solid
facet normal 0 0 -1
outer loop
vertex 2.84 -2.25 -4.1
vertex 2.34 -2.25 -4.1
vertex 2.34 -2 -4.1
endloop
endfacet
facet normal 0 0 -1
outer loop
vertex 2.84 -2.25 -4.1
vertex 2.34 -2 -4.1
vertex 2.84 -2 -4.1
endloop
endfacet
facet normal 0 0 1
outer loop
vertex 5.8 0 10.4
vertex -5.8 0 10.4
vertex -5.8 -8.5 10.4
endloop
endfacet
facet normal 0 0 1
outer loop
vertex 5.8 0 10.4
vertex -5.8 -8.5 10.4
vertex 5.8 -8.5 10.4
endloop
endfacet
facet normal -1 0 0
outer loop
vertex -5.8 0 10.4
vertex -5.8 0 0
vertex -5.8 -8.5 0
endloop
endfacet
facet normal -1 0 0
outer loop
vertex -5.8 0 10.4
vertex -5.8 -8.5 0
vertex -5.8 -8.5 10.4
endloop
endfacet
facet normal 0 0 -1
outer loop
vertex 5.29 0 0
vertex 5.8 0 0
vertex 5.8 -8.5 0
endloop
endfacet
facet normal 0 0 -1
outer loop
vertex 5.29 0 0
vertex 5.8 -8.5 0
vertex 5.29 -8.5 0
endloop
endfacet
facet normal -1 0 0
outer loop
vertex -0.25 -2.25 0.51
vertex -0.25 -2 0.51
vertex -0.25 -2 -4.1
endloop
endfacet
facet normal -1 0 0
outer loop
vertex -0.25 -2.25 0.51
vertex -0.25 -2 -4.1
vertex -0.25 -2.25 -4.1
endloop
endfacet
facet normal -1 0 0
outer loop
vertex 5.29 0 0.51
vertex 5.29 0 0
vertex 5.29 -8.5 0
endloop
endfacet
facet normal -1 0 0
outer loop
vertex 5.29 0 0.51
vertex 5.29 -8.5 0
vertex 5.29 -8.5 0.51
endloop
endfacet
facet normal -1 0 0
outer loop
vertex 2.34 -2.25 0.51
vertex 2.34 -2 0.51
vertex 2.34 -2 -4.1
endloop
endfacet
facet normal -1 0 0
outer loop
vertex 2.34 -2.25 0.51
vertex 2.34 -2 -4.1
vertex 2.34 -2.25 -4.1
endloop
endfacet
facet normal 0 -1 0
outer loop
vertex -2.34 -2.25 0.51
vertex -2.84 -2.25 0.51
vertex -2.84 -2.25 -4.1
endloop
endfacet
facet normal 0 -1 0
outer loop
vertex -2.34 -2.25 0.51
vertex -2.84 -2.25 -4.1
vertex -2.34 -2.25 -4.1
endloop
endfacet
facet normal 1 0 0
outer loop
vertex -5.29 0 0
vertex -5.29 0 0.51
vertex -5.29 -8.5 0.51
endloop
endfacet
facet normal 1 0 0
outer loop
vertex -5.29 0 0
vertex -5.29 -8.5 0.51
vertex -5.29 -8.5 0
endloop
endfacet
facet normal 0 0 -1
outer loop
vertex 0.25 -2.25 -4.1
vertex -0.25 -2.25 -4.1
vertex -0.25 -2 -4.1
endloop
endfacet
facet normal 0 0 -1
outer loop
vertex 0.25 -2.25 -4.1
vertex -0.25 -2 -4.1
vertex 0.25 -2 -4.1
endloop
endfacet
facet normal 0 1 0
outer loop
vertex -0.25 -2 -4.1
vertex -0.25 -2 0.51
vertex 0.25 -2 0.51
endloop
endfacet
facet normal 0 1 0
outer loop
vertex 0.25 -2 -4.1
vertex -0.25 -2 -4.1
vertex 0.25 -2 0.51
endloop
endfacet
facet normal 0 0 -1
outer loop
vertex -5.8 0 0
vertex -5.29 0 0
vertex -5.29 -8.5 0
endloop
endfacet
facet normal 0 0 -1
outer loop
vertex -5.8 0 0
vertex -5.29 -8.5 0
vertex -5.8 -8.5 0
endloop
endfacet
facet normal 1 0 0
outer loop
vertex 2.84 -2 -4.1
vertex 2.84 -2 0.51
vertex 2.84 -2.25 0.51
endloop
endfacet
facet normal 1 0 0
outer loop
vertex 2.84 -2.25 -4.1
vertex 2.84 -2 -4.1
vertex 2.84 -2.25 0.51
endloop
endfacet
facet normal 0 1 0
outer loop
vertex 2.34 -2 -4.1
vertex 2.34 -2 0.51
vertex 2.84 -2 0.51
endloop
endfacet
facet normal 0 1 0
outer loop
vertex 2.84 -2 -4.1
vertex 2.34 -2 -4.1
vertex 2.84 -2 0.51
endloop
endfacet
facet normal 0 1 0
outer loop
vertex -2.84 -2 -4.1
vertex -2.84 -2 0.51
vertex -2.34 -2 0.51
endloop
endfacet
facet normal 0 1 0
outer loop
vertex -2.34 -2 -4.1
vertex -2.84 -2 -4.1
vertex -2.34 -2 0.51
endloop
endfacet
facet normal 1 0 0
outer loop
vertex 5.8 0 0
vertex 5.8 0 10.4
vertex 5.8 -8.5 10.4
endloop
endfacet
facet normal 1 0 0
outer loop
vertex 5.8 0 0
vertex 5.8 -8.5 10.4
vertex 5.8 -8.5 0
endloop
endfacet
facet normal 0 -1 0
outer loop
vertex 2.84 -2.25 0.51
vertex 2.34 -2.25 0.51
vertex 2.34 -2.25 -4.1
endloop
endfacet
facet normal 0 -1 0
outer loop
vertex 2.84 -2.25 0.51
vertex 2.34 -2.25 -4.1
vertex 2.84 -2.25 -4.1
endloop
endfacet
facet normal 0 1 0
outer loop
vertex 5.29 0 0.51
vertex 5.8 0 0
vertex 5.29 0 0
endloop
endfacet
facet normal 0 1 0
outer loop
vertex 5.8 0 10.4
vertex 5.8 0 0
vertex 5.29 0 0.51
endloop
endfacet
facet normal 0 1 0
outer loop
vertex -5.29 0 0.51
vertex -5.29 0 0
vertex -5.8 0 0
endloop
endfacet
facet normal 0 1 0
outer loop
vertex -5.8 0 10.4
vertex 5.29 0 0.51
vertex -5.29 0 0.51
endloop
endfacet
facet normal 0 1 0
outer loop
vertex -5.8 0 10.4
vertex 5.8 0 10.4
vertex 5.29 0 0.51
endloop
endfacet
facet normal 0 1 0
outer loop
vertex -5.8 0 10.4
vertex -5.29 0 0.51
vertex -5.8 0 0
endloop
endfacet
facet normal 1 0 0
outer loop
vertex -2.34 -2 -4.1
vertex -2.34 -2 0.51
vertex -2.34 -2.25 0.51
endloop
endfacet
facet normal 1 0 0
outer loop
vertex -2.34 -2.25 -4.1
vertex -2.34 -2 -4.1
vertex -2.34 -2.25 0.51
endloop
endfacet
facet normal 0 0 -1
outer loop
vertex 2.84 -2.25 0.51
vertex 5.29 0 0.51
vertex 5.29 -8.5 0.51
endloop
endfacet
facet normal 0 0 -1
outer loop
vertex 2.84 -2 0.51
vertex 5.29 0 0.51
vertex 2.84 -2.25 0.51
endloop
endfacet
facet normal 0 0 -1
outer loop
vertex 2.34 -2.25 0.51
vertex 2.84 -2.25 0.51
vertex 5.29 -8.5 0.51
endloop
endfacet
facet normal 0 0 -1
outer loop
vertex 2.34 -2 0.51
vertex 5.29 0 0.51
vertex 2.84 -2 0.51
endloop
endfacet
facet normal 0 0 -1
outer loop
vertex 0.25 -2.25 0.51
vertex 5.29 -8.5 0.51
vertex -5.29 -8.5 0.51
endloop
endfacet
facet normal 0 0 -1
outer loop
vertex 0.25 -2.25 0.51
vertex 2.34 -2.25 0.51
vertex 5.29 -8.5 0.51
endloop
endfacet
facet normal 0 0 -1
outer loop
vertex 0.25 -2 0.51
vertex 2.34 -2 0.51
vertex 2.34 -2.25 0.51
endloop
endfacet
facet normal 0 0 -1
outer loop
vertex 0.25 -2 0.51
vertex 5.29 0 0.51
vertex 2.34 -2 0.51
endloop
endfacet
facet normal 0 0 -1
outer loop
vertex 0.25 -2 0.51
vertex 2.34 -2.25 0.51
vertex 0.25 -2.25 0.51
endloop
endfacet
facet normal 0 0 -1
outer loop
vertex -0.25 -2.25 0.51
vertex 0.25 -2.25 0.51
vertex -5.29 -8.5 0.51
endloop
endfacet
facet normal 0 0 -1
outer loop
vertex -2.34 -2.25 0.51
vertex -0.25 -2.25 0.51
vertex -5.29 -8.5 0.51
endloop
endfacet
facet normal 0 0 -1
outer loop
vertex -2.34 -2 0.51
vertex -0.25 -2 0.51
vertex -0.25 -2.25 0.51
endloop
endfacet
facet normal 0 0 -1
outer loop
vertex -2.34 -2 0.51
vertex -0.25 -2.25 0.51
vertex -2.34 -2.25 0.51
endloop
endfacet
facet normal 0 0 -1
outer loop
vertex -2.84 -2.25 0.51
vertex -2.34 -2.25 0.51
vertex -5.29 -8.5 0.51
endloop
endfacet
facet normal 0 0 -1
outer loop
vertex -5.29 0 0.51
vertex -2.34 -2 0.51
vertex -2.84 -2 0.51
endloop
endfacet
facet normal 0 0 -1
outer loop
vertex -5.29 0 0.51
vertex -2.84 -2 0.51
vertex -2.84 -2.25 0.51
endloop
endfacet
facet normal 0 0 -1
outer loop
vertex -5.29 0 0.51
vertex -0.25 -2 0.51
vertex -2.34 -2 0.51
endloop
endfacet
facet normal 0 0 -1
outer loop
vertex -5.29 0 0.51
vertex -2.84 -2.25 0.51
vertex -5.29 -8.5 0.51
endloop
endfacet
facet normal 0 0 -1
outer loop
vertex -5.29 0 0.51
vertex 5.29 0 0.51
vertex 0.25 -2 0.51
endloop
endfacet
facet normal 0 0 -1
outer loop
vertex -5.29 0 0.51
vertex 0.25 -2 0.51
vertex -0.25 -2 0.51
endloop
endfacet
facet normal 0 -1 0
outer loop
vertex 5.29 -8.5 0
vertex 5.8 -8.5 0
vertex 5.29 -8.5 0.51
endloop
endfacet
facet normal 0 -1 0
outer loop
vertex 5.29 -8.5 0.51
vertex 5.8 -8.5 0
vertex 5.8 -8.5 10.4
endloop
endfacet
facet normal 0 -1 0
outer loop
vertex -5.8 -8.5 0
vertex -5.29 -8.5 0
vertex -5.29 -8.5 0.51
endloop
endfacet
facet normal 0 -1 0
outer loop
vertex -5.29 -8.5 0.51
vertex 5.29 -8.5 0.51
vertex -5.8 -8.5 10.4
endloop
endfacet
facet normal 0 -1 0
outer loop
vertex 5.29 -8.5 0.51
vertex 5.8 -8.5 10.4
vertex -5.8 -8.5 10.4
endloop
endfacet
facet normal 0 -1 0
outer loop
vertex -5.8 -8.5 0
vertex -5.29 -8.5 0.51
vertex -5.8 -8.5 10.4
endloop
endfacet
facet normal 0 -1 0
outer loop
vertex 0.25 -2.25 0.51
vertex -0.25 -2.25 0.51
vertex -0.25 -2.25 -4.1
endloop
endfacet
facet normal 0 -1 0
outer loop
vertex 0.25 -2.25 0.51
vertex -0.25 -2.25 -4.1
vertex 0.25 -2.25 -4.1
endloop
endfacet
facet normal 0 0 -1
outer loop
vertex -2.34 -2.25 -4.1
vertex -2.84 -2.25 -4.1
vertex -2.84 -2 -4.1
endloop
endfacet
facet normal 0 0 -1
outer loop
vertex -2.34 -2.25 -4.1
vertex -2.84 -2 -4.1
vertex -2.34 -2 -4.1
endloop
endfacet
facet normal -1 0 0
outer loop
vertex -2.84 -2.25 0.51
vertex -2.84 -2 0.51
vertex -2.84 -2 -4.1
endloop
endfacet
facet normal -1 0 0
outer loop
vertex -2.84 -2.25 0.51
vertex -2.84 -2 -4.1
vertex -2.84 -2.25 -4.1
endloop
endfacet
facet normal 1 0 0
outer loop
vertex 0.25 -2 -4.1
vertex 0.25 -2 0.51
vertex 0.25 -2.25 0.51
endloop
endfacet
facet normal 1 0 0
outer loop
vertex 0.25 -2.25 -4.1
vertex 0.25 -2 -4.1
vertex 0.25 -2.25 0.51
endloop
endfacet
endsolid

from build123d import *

# Parameters (mm, degrees)
PAD_DEPTH    = 8.5
SKETCH001_W  = 0.5
SKETCH001_H  = 0.25
PAD001_DEPTH = 4.61


with BuildPart() as part:
    # Sketch → Pad (new body)
    with BuildSketch(Plane.XZ):
        Polygon((-5.29, 0), (-5.8, 0), (-5.8, 10.4), (5.8, 10.4), (5.8, 0), (5.29, 0), (5.29, 0.51), (-5.29, 0.51), align=None)
    extrude(amount=PAD_DEPTH)

    # Sketch001 → Pad001 (new body)
    with BuildSketch(Plane(origin=(0, 0, 0.51), x_dir=(1, 0, 0), z_dir=(0, 0, -1))):
        with Locations((-2.59, 2.125)):
            Rectangle(SKETCH001_W, SKETCH001_H)
        with Locations((0, 2.125)):
            Rectangle(SKETCH001_W, SKETCH001_H)
        with Locations((2.59, 2.125)):
            Rectangle(SKETCH001_W, SKETCH001_H)
    extrude(amount=PAD001_DEPTH)


solid = part.part
